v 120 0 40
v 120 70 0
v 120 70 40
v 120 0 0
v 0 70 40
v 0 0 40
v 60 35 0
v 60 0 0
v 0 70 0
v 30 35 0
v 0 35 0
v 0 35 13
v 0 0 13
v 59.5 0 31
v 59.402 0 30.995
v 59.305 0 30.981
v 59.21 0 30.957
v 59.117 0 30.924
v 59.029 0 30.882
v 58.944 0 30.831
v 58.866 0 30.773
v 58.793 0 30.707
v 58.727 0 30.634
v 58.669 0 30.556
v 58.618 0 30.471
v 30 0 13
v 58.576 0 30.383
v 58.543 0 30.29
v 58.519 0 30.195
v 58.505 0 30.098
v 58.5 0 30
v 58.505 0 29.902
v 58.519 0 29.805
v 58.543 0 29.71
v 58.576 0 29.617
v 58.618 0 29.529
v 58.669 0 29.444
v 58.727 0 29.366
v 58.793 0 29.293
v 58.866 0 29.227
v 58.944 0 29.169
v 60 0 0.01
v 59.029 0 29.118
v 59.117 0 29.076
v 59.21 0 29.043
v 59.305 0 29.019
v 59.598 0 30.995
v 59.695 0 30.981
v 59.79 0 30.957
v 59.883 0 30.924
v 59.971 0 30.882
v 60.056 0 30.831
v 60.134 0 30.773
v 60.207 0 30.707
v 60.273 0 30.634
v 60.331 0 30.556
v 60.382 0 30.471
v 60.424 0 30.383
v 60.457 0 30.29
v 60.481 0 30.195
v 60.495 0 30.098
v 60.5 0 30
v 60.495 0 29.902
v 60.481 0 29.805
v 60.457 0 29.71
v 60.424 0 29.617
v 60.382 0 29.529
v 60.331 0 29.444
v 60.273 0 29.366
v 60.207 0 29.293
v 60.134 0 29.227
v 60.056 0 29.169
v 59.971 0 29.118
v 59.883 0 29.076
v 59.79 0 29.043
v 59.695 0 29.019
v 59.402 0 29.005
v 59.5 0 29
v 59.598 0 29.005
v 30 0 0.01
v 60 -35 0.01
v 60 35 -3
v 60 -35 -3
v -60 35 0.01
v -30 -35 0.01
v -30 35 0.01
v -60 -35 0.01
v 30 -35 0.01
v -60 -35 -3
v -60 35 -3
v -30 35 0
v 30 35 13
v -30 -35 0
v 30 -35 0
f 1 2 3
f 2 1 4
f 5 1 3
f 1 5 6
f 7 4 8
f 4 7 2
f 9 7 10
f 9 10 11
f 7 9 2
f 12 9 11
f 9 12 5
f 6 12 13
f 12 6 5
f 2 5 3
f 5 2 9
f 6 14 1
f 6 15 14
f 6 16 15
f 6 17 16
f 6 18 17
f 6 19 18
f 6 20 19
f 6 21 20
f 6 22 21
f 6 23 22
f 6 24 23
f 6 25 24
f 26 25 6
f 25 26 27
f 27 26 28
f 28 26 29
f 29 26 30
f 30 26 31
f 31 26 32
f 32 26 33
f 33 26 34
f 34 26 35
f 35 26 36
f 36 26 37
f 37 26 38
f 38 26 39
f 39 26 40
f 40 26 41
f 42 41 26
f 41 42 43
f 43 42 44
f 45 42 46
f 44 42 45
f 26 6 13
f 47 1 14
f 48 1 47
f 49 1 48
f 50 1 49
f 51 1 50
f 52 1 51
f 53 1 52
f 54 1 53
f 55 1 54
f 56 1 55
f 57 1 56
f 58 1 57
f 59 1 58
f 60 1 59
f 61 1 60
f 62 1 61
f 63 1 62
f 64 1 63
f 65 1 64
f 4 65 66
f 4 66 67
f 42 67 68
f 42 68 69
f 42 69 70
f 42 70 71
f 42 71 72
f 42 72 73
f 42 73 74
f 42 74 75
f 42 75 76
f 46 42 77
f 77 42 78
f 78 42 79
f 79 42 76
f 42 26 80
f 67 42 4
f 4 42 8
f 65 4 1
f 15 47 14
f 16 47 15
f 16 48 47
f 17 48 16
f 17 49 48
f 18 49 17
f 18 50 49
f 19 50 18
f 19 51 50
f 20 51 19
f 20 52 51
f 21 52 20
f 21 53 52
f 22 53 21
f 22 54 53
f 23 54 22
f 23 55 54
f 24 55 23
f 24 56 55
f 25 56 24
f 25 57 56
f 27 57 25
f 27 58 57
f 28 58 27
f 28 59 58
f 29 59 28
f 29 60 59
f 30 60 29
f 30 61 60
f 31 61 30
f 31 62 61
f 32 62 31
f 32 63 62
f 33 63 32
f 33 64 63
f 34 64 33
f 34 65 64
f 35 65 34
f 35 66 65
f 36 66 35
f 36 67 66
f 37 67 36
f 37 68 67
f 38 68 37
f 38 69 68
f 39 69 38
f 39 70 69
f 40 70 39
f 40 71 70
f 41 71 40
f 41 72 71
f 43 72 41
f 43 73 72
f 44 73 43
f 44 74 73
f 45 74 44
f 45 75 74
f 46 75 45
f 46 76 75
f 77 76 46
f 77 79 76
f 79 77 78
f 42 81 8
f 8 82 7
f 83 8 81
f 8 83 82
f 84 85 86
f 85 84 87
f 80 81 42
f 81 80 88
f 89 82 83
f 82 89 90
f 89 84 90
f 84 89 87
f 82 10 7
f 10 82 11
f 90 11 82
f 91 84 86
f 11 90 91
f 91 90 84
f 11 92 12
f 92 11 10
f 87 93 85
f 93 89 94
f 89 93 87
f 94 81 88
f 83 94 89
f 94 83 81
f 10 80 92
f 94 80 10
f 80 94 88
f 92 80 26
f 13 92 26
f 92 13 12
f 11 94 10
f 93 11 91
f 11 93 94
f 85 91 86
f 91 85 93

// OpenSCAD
// Mini horizontal gel-electrophoresis box - buffer tank
// Print orientation: tank rests on XY plane, builds up in +Z

$fn = 64;

// ---- Tank dimensions ----
outer_x = 120;   // outer length along X
outer_y = 70;    // outer width along Y
outer_z = 40;    // outer height along Z
wall    = 3;     // wall thickness (X and Y)
floor   = 3;     // floor thickness under the inner floor

// ---- Platform dimensions ----
plat_x     = 60;   // platform length along X (centred)
plat_w     = outer_y; // platform spans full inner width
plat_top_z = 13;   // height of platform top above tank bottom

// ---- Electrode holes ----
hole_d = 2;     // hole diameter
hole_y = 0;     // hole Y position
hole_z = 30;    // hole Z position

// ---- Derived ----
inner_x = outer_x - 2*wall;
inner_z = outer_z - floor;
eps     = 0.5;  // cutter overshoot

difference() {
    // Tank body
    union() {
        cube([outer_x, outer_y, outer_z]);
        // floor slab under the inner floor
        translate([-outer_x/2, -outer_y/2, -floor])
            cube([outer_x, outer_y, floor + 0.01]);
    }

    // Raised platform
    translate([-plat_x/2, -plat_w/2, 0])
        cube([plat_x, plat_w, plat_top_z]);

    // Electrode holes through end walls
    for (sx = [-1, 1])
        translate([sx * (outer_x/2 - eps), hole_y, hole_z])
            rotate([90, 0, 0])
                cylinder(d = hole_d, h = wall + eps);
}
